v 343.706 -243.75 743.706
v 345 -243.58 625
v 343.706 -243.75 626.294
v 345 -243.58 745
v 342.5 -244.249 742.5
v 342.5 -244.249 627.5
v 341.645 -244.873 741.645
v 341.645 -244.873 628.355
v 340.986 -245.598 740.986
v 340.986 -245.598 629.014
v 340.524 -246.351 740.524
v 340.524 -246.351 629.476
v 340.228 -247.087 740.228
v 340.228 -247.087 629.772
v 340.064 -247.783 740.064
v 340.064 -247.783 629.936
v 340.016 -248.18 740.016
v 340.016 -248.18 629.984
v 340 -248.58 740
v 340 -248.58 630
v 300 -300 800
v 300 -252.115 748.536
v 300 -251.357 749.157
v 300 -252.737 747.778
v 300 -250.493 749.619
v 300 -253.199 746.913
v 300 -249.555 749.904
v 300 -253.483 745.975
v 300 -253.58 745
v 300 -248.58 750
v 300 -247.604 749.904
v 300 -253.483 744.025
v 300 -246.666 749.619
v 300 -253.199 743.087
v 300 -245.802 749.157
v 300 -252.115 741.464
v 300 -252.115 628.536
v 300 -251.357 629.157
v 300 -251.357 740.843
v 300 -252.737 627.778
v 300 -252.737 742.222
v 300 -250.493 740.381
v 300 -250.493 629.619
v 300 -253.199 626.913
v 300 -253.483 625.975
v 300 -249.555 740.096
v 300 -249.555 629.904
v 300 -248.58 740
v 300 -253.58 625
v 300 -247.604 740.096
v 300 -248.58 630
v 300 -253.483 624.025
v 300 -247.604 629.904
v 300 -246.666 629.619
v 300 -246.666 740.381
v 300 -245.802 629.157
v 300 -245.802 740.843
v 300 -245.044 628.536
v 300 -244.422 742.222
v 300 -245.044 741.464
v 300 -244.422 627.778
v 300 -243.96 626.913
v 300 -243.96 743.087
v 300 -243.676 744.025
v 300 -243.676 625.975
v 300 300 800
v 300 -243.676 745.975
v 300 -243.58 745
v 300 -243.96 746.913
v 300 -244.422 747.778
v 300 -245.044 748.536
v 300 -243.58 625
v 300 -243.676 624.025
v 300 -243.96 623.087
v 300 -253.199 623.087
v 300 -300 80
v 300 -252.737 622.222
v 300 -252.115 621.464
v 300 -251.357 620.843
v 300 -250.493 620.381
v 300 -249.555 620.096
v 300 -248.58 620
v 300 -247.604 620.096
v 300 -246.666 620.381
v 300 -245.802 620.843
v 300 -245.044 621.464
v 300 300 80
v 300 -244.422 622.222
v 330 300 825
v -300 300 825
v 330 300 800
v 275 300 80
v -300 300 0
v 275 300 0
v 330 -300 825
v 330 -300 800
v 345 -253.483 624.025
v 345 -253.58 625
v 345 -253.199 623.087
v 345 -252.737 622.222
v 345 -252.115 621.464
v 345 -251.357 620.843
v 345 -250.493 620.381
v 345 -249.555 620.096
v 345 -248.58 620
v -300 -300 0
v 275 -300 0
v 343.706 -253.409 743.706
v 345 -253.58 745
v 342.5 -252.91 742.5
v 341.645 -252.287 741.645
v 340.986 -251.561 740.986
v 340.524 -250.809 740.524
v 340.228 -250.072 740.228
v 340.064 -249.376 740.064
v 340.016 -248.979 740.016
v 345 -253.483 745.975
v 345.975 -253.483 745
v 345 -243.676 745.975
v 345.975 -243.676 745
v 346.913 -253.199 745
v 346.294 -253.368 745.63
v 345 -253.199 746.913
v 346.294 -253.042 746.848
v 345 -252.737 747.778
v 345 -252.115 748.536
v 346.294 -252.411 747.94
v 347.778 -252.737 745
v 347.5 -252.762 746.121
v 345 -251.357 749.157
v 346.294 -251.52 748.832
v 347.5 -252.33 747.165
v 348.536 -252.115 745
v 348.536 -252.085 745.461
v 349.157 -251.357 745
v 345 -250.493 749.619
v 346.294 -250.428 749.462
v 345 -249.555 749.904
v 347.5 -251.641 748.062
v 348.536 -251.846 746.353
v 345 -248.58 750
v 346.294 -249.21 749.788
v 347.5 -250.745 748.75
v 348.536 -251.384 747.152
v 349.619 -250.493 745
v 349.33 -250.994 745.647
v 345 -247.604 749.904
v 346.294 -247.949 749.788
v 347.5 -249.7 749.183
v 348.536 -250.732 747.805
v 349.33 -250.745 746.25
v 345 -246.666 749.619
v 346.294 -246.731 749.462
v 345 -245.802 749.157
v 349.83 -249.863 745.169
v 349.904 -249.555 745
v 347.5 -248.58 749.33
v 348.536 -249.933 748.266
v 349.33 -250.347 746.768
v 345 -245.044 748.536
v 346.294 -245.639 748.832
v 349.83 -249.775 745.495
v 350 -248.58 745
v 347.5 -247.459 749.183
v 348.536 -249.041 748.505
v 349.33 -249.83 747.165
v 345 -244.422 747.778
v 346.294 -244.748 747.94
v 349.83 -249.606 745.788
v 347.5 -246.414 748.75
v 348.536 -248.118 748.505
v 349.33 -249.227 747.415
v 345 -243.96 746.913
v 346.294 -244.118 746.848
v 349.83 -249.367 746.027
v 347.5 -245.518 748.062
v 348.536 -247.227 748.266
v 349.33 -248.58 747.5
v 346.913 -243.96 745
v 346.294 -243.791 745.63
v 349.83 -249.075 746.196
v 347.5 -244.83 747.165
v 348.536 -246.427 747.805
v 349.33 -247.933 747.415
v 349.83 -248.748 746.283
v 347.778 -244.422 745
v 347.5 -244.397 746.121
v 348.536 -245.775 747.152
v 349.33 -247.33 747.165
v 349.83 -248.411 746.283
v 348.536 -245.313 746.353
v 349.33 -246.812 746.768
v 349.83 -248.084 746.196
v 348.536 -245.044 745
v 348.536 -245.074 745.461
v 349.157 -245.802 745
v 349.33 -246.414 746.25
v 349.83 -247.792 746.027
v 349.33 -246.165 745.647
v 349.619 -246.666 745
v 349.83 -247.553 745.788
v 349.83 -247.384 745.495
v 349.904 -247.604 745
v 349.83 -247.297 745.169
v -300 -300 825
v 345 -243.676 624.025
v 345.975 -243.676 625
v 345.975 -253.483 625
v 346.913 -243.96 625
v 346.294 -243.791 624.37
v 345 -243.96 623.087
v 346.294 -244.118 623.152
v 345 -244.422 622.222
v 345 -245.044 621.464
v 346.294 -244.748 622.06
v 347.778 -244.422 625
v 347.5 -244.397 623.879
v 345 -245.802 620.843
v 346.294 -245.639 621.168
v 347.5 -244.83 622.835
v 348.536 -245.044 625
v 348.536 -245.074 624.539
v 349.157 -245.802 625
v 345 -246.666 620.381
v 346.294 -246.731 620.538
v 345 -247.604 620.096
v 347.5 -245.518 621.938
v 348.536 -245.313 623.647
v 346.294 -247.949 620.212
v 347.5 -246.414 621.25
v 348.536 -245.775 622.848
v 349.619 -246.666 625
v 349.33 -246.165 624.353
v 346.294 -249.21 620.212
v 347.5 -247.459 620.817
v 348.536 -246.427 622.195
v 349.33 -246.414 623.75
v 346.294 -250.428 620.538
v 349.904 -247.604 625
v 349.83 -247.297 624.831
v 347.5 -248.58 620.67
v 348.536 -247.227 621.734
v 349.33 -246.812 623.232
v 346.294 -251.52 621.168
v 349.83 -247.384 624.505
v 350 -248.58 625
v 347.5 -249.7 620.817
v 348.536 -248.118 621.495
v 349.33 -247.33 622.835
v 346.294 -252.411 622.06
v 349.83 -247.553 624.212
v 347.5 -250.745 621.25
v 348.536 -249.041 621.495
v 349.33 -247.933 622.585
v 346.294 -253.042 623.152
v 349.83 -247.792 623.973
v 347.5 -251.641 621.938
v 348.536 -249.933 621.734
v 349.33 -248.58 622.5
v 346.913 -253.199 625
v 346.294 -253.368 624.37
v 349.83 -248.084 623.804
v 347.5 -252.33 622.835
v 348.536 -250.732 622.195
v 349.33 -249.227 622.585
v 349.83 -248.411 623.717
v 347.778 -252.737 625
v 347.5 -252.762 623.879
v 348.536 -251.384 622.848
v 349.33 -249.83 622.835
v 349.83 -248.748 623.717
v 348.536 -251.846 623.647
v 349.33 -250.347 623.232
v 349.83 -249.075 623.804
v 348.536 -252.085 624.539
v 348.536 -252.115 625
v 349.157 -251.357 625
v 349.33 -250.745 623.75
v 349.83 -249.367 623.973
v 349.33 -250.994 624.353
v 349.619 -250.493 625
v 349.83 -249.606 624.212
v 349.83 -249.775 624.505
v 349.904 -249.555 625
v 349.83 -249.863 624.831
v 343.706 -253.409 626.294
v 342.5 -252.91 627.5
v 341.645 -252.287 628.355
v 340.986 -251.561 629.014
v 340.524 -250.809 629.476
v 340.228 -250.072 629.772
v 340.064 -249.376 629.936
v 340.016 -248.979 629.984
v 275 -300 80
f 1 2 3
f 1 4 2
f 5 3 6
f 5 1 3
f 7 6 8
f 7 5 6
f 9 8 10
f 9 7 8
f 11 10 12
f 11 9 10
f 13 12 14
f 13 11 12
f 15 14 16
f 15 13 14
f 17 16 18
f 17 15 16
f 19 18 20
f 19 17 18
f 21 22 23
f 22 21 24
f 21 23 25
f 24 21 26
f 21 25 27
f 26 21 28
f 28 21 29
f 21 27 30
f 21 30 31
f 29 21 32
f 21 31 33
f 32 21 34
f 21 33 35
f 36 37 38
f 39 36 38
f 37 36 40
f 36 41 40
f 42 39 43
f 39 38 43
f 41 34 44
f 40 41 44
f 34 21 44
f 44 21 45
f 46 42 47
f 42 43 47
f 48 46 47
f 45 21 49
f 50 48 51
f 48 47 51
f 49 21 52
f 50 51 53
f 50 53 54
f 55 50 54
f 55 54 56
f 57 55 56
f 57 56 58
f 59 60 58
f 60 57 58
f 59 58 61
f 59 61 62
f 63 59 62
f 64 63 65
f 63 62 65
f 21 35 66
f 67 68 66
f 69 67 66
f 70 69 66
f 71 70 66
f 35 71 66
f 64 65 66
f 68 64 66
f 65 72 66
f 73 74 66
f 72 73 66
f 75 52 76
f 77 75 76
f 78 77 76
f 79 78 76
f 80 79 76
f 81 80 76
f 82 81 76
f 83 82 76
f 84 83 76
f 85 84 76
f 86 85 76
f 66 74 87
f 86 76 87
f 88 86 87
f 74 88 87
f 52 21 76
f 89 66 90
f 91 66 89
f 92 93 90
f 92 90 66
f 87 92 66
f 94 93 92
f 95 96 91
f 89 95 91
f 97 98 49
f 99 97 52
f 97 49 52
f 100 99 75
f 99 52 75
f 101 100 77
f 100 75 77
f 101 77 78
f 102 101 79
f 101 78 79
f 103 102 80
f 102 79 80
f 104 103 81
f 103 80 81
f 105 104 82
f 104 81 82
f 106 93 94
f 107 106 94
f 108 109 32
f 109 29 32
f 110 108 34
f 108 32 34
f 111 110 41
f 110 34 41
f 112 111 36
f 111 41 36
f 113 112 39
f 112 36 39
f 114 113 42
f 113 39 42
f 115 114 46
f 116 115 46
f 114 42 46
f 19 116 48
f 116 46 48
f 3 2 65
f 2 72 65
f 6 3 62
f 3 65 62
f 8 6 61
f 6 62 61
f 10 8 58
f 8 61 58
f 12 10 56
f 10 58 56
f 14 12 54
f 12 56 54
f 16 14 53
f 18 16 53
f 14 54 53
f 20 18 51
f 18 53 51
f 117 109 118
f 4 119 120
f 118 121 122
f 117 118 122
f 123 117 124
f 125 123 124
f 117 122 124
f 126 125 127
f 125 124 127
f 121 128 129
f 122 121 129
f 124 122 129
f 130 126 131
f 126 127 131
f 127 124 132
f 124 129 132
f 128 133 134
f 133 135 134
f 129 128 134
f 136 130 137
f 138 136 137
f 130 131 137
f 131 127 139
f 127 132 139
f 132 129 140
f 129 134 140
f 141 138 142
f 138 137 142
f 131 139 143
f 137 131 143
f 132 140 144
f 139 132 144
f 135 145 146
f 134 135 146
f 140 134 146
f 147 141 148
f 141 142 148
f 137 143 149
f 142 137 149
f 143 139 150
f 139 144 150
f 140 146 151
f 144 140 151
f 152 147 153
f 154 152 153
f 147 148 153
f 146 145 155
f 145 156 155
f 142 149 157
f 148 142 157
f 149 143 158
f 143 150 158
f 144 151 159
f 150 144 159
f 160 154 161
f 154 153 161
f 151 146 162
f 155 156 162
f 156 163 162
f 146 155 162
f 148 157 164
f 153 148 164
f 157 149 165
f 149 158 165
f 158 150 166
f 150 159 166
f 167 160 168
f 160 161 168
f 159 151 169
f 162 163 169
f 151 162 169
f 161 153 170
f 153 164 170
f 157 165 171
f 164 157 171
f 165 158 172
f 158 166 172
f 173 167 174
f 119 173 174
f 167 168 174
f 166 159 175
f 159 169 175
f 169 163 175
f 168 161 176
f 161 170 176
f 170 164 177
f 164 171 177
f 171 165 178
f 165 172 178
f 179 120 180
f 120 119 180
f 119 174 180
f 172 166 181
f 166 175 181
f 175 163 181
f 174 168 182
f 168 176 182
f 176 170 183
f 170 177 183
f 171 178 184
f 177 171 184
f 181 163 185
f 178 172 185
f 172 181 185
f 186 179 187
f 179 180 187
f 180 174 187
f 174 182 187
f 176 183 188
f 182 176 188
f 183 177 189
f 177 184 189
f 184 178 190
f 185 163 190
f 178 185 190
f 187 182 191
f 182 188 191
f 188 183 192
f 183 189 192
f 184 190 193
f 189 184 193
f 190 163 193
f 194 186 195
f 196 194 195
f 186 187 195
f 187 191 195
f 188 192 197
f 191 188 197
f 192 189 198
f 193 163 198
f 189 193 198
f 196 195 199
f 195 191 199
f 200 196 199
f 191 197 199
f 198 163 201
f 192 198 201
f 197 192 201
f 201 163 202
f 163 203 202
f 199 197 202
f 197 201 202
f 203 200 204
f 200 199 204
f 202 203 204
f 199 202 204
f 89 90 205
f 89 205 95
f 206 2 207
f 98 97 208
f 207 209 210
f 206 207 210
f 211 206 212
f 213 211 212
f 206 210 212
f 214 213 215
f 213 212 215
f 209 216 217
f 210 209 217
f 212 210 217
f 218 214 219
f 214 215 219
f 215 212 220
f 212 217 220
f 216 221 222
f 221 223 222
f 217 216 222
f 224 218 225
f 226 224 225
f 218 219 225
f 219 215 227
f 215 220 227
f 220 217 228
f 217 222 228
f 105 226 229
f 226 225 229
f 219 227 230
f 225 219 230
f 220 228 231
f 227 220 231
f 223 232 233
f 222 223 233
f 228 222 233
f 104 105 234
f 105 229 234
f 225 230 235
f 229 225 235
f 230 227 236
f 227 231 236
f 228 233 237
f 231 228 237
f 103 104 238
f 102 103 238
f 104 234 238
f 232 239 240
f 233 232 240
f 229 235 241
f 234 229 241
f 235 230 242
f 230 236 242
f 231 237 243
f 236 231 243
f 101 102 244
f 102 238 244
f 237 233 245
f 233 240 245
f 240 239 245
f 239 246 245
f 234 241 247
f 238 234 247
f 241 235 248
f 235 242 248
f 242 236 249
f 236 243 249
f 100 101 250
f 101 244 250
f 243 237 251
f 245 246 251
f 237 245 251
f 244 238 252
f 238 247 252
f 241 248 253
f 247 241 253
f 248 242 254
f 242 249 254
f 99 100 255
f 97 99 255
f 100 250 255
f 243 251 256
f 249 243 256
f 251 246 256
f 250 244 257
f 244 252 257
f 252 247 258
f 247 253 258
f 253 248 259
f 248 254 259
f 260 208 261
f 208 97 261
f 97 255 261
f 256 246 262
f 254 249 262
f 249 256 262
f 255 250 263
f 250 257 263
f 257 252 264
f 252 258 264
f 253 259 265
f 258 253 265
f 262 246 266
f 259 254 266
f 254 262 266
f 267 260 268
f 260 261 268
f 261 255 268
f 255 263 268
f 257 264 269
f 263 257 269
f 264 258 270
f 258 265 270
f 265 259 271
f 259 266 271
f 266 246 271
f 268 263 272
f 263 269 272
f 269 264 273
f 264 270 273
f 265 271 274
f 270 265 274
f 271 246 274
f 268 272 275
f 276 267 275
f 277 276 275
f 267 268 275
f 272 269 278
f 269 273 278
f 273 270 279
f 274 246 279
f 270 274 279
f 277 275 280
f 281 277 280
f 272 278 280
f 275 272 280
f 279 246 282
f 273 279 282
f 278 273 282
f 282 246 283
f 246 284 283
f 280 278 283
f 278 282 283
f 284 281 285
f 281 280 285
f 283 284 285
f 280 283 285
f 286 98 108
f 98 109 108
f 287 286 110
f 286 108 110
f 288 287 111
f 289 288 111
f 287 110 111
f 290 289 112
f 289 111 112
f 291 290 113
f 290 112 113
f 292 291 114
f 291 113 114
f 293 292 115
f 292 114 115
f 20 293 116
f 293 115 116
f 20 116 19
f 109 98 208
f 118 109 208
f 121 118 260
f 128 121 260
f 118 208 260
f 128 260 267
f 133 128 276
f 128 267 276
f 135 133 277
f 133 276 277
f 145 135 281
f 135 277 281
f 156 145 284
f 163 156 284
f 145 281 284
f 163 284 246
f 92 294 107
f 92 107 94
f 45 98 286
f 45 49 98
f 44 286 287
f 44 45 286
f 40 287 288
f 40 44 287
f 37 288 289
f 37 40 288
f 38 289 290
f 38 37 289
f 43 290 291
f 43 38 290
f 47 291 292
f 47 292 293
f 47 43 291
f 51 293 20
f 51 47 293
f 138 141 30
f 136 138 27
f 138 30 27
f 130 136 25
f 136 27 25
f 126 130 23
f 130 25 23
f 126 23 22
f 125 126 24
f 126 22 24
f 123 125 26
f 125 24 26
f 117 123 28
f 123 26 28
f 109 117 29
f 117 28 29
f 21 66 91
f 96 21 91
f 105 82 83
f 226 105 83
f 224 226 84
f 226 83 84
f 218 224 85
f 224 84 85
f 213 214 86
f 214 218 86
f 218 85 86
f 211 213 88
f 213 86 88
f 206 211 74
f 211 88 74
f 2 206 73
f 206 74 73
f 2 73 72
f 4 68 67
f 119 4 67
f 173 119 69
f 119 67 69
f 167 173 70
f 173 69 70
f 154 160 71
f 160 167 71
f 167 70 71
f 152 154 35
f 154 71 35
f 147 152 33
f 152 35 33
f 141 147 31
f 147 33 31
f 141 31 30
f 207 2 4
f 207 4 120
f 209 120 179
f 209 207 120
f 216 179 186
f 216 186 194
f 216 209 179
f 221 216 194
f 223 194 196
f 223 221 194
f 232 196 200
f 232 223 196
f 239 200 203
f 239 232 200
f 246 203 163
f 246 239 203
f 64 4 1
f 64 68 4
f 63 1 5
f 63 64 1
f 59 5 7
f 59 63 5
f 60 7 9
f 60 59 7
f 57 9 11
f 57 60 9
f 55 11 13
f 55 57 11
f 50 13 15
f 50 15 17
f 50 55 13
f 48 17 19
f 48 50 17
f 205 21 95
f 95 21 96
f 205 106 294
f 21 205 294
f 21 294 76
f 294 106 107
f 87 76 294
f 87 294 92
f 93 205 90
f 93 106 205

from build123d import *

# Parameters (mm, degrees)
F0_W        = 600
F0_H        = 600
F1_DEPTH    = 800
F2_W        = 600
F2_H        = 80
F3_DEPTH    = 25
F5_DEPTH    = 50
F6_T1_DEPTH = 120
F6_T4_ANGLE = 180
F6_T6_ANGLE = 180
F7_W        = 40
F7_H        = 110
F8_DEPTH    = 25
F9_R        = 4.99999
F10_W       = 630
F10_H       = 600
F11_DEPTH   = 25


# Not quite as in the source:
# - a fillet or chamfer that OpenCascade refuses, or shapes differently, is made with other operations: its cross-section is extruded or revolved along the edge and cut away or added
# - a fillet or chamfer is up to 0.001 mm smaller than in the source, because OpenCascade refuses the exact size


with BuildPart() as f1:
    # F0 (on Top) → F1 (new body)
    with BuildSketch(Plane.XY):
        Rectangle(F0_W, F0_H)
    extrude(amount=F1_DEPTH)

    # F2 (on face) → F3 (cut)
    with BuildSketch(Plane.YZ.offset(300)):
        with Locations((0, 40)):
            Rectangle(F2_W, F2_H)
    extrude(amount=-F3_DEPTH, mode=Mode.SUBTRACT)

    # F4 (on face) → F5 (join)
    with BuildSketch(Plane.YZ.offset(300)):
        with BuildLine():
            ThreePointArc((-248.5795542598, 750), (-252.1150881657, 748.5355339059), (-253.5795542598, 745))
            Line((-253.5795542598, 745), (-253.5795542598, 625))
            ThreePointArc((-253.5795542598, 625), (-252.1150881657, 621.4644660941), (-248.5795542598, 620))
            ThreePointArc((-248.5795542598, 620), (-245.0440203538, 621.4644660941), (-243.5795542598, 625))
            Line((-243.5795542598, 625), (-243.5795542598, 745))
            ThreePointArc((-243.5795542598, 745), (-245.0440203538, 748.5355339059), (-248.5795542598, 750))
        make_face()
    extrude(amount=F5_DEPTH)

    # F6: fillet of radius 5 on 4 edges, made by hand

    # F6_s2 → F6_t1 (cut)
    with BuildSketch(Plane.XY.offset(625)):
        with BuildLine():
            ThreePointArc((345, -253.5795542598), (348.5355339059, -252.1150881657), (350, -248.5795542598))
            Line((350, -248.5795542598), (350, -253.5795542598))
            Line((350, -253.5795542598), (345, -253.5795542598))
        make_face()
        with BuildLine():
            ThreePointArc((345, -243.5795542598), (348.5355339059, -245.0440203538), (350, -248.5795542598))
            Line((350, -248.5795542598), (350, -243.5795542598))
            Line((350, -243.5795542598), (345, -243.5795542598))
        make_face()
    extrude(amount=F6_T1_DEPTH, mode=Mode.SUBTRACT)

    # F6_s3 → F6_t4 (revolve, cut)
    with BuildSketch(Plane.XY.offset(745)):
        with BuildLine():
            ThreePointArc((345, -253.5795542598), (348.5355339059, -252.1150881657), (350, -248.5795542598))
            Line((350, -248.5795542598), (350, -253.5795542598))
            Line((350, -253.5795542598), (345, -253.5795542598))
        make_face()
    revolve(axis=Axis((350, -248.5795542598, 745), (-1, 0, 0)), revolution_arc=F6_T4_ANGLE, mode=Mode.SUBTRACT)

    # F6_s5 → F6_t6 (revolve, cut)
    with BuildSketch(Plane.XY.offset(625)):
        with BuildLine():
            ThreePointArc((345, -243.5795542598), (348.5355339059, -245.0440203538), (350, -248.5795542598))
            Line((350, -248.5795542598), (350, -243.5795542598))
            Line((350, -243.5795542598), (345, -243.5795542598))
        make_face()
    revolve(axis=Axis((350, -248.5795542598, 625), (-1, 0, 0)), revolution_arc=F6_T6_ANGLE, mode=Mode.SUBTRACT)

    # F7 (on face) → F8 (cut)
    with BuildSketch(Plane(origin=(0, -243.5795542598, 0), x_dir=(-1, 0, 0), z_dir=(0, 1, 0))):
        with Locations((-320, 685)):
            Rectangle(F7_W, F7_H)
    extrude(amount=-F8_DEPTH, mode=Mode.SUBTRACT)

    # F9 (radius 5 in the source; OpenCascade refuses exactly that, so slightly less here)
    f9_edges = [f1.edges().sort_by_distance(p)[0] for p in [
        (320, -243.579554, 740),
        (340, -243.579554, 685),
        (320, -243.579554, 630),
        (320, -253.579554, 740),
        (340, -253.579554, 685),
        (320, -253.579554, 630),
    ]]
    fillet(f9_edges, radius=F9_R)

    # F10 (on face) → F11 (join)
    with BuildSketch(Plane.XY.offset(800)):
        with Locations((15, 0)):
            Rectangle(F10_W, F10_H)
    extrude(amount=F11_DEPTH)


solid = f1.part
